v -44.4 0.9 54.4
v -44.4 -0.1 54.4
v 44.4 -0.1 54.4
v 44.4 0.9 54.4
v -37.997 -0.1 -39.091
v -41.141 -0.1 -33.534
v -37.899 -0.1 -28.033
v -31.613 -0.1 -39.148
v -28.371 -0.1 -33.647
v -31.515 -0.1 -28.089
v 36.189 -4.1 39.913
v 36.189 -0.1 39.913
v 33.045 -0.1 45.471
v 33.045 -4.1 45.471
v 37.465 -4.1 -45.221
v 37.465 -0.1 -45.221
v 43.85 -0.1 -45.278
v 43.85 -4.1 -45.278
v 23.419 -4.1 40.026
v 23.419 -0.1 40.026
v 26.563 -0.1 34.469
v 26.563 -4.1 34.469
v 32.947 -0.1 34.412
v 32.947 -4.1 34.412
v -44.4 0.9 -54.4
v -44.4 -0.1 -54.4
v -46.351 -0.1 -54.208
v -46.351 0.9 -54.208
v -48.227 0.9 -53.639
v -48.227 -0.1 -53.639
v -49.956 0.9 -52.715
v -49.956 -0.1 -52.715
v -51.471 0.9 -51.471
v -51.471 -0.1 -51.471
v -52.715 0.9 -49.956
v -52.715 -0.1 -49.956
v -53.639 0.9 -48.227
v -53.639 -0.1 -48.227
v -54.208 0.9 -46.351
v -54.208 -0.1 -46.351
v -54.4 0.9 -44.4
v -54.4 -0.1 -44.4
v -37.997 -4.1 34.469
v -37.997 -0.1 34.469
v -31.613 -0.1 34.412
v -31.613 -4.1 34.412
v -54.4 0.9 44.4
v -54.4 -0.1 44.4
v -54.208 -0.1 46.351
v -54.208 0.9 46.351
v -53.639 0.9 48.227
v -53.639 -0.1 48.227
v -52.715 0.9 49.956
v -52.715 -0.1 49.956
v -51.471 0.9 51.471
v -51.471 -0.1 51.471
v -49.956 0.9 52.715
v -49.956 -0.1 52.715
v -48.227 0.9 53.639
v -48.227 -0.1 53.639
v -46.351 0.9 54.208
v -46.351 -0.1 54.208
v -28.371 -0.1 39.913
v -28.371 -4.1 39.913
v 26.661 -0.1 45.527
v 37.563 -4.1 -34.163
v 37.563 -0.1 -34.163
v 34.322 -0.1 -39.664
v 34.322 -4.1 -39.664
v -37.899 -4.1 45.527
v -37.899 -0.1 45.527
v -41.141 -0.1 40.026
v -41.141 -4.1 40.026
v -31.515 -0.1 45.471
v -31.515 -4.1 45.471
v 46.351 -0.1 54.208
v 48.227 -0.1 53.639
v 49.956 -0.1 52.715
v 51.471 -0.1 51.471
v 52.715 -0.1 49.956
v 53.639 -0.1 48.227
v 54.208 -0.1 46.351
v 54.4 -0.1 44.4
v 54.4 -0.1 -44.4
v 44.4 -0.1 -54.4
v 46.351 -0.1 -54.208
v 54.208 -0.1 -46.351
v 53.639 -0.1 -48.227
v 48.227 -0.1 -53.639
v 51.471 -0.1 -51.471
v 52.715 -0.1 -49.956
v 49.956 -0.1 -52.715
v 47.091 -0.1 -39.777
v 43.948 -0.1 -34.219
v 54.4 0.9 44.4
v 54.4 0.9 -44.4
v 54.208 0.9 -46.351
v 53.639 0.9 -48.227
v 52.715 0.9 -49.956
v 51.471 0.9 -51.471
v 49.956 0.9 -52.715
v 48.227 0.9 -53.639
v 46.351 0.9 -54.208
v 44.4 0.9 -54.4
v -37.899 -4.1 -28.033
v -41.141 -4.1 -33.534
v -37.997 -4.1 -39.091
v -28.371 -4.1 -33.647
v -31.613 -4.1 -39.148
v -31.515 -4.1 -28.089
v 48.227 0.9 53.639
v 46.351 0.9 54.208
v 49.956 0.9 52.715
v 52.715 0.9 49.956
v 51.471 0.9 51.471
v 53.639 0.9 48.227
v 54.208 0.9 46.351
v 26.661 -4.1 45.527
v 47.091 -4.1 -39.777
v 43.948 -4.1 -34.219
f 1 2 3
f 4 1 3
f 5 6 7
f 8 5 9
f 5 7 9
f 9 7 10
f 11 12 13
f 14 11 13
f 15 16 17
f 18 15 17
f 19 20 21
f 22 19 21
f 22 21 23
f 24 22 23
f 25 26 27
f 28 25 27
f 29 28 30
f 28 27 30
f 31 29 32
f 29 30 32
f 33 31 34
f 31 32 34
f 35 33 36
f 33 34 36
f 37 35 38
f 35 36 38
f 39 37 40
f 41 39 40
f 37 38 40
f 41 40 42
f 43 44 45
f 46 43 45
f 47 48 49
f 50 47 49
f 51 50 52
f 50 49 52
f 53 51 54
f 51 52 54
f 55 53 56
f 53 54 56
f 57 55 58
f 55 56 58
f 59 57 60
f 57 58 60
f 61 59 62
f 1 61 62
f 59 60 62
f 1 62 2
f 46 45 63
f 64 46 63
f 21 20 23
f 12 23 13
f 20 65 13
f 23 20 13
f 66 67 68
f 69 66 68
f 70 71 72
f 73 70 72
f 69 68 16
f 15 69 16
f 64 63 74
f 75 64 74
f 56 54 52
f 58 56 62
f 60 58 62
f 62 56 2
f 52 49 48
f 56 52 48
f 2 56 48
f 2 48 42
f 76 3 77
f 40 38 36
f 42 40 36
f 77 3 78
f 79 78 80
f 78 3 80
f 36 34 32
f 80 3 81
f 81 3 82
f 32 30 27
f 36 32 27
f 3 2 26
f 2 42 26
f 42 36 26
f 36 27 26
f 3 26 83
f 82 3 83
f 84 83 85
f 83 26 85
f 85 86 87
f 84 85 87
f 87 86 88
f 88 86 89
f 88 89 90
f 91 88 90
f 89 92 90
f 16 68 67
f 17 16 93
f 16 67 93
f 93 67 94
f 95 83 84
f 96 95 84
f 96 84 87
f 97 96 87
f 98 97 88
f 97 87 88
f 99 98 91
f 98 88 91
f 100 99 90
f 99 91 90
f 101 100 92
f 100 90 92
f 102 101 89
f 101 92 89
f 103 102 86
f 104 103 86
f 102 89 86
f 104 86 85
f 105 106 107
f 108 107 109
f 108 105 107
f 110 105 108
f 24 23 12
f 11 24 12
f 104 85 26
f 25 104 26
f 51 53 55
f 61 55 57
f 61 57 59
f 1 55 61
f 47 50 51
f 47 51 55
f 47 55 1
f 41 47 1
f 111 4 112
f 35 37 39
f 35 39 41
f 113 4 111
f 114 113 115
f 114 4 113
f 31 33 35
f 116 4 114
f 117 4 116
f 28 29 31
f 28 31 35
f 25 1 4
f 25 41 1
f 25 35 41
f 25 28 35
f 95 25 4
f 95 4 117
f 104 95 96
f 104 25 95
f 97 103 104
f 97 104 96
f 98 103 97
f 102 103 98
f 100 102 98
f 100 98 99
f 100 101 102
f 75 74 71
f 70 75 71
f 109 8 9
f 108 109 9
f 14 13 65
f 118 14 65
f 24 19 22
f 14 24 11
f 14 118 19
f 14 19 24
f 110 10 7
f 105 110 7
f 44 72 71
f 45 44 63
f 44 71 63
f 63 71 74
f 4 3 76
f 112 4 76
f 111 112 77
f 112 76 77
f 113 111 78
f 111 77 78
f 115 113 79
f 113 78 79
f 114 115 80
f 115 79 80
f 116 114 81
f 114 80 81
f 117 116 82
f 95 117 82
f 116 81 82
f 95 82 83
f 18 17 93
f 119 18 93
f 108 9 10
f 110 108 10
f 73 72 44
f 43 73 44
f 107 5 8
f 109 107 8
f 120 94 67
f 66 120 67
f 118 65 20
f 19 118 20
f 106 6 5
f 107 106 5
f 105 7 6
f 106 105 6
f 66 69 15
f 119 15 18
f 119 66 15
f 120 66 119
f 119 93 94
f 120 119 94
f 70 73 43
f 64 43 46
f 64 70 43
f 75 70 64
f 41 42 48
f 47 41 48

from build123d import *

# Parameters (mm, degrees)
BOSS_EXTRUDE1_DEPTH   = 0.1
BOSS_EXTRUDE2_START   = -0.1
BOSS_EXTRUDE2_DEPTH   = 1
BOSS_EXTRUDE3_DEPTH   = 4
BOSS_EXTRUDE3_2_DEPTH = 4
BOSS_EXTRUDE3_3_DEPTH = 4
BOSS_EXTRUDE3_4_DEPTH = 4


with BuildPart() as part:
    # Sketch2 → Boss-Extrude1 (new body)
    with BuildSketch(Plane(origin=(0, 0, 0), x_dir=(1, 0, 0), z_dir=(0, 1, 0))):
        with BuildLine():
            Line((44.4, 52.9), (-44.4, 52.9))
            ThreePointArc((-44.4, 52.9), (-50.41040764, 50.41040764), (-52.9, 44.4))
            Line((-52.9, 44.4), (-52.9, -44.4))
            ThreePointArc((-52.9, -44.4), (-50.41040764, -50.41040764), (-44.4, -52.9))
            Line((-44.4, -52.9), (44.4, -52.9))
            ThreePointArc((44.4, -52.9), (50.41040764, -50.41040764), (52.9, -44.4))
            Line((52.9, -44.4), (52.9, 44.4))
            ThreePointArc((52.9, 44.4), (50.41040764, 50.41040764), (44.4, 52.9))
        make_face()
        with BuildLine():
            Line((44.4, 51.9), (-44.4, 51.9))
            ThreePointArc((-44.4, 51.9), (-49.703300859, 49.703300859), (-51.9, 44.4))
            Line((-51.9, 44.4), (-51.9, -44.4))
            ThreePointArc((-51.9, -44.4), (-49.703300859, -49.703300859), (-44.4, -51.9))
            Line((-44.4, -51.9), (44.4, -51.9))
            ThreePointArc((44.4, -51.9), (49.703300859, -49.703300859), (51.9, -44.4))
            Line((51.9, -44.4), (51.9, 44.4))
            ThreePointArc((51.9, 44.4), (49.703300859, 49.703300859), (44.4, 51.9))
        make_face(mode=Mode.SUBTRACT)
    extrude(amount=-BOSS_EXTRUDE1_DEPTH)

    # Sketch1 → Boss-Extrude2 (add)
    with BuildSketch(Plane(origin=(0, 0, 0), x_dir=(1, 0, 0), z_dir=(0, 1, 0)).offset(BOSS_EXTRUDE2_START)):
        with BuildLine():
            Line((54.4, -44.4), (54.4, 44.4))
            ThreePointArc((54.4, 44.4), (51.471067812, 51.471067812), (44.4, 54.4))
            Line((44.4, 54.4), (-44.4, 54.4))
            ThreePointArc((-44.4, 54.4), (-51.471067812, 51.471067812), (-54.4, 44.4))
            Line((-54.4, 44.4), (-54.4, -44.4))
            ThreePointArc((-54.4, -44.4), (-51.471067812, -51.471067812), (-44.4, -54.4))
            Line((-44.4, -54.4), (44.4, -54.4))
            ThreePointArc((44.4, -54.4), (51.471067812, -51.471067812), (54.4, -44.4))
        make_face()
        with BuildLine():
            ThreePointArc((-44.4, 53.4), (-50.763961031, 50.763961031), (-53.4, 44.4))
            Line((-53.4, 44.4), (-53.4, -44.4))
            ThreePointArc((-53.4, -44.4), (-50.763961031, -50.763961031), (-44.4, -53.4))
            Line((-44.4, -53.4), (44.4, -53.4))
            ThreePointArc((44.4, -53.4), (50.763961031, -50.763961031), (53.4, -44.4))
            Line((53.4, -44.4), (53.4, 44.4))
            ThreePointArc((53.4, 44.4), (50.763961031, 50.763961031), (44.4, 53.4))
            Line((44.4, 53.4), (-44.4, 53.4))
        make_face(mode=Mode.SUBTRACT)
        with BuildLine():
            Line((-44.4, 53.4), (44.4, 53.4))
            ThreePointArc((44.4, 53.4), (50.763961031, 50.763961031), (53.4, 44.4))
            Line((53.4, 44.4), (53.4, -44.4))
            ThreePointArc((53.4, -44.4), (50.763961031, -50.763961031), (44.4, -53.4))
            Line((44.4, -53.4), (-44.4, -53.4))
            ThreePointArc((-44.4, -53.4), (-50.763961031, -50.763961031), (-53.4, -44.4))
            Line((-53.4, -44.4), (-53.4, 44.4))
            ThreePointArc((-53.4, 44.4), (-50.763961031, 50.763961031), (-44.4, 53.4))
        make_face()
    extrude(amount=BOSS_EXTRUDE2_DEPTH)


with BuildPart() as body_2:
    # Sketch3 → Boss-Extrude3 (new body)
    with BuildSketch(Plane.XZ.offset(0.1)):
        Polygon((-41.140539781, 40.026118716), (-37.997071749, 34.468775471), (-31.612537306, 34.41242702), (-28.371470895, 39.913421814), (-31.514938926, 45.470765058), (-37.899473369, 45.527113509), align=None)
    extrude(amount=BOSS_EXTRUDE3_DEPTH)


with BuildPart() as body_3:
    # Sketch3 → Boss-Extrude3 2 (new body)
    with BuildSketch(Plane.XZ.offset(0.1)):
        Polygon((23.419460219, 40.026118716), (26.56292825, 34.468775471), (32.947462693, 34.41242702), (36.188529105, 39.913421814), (33.045061073, 45.470765058), (26.66052663, 45.527113509), align=None)
    extrude(amount=BOSS_EXTRUDE3_2_DEPTH)


with BuildPart() as body_4:
    # Sketch3 → Boss-Extrude3 3 (new body)
    with BuildSketch(Plane.XZ.offset(0.1)):
        Polygon((34.321988768, -39.663881284), (37.4654568, -45.221224529), (43.849991243, -45.27757298), (47.091057654, -39.776578186), (43.947589623, -34.219234942), (37.56305518, -34.162886491), align=None)
    extrude(amount=BOSS_EXTRUDE3_3_DEPTH)


with BuildPart() as body_5:
    # Sketch3 → Boss-Extrude3 4 (new body)
    with BuildSketch(Plane.XZ.offset(0.1)):
        Polygon((-41.140539781, -33.533881284), (-37.997071749, -39.091224529), (-31.612537306, -39.14757298), (-28.371470895, -33.646578186), (-31.514938926, -28.089234942), (-37.899473369, -28.032886491), align=None)
    extrude(amount=BOSS_EXTRUDE3_4_DEPTH)


solid = Compound([part.part, body_2.part, body_3.part, body_4.part, body_5.part])
